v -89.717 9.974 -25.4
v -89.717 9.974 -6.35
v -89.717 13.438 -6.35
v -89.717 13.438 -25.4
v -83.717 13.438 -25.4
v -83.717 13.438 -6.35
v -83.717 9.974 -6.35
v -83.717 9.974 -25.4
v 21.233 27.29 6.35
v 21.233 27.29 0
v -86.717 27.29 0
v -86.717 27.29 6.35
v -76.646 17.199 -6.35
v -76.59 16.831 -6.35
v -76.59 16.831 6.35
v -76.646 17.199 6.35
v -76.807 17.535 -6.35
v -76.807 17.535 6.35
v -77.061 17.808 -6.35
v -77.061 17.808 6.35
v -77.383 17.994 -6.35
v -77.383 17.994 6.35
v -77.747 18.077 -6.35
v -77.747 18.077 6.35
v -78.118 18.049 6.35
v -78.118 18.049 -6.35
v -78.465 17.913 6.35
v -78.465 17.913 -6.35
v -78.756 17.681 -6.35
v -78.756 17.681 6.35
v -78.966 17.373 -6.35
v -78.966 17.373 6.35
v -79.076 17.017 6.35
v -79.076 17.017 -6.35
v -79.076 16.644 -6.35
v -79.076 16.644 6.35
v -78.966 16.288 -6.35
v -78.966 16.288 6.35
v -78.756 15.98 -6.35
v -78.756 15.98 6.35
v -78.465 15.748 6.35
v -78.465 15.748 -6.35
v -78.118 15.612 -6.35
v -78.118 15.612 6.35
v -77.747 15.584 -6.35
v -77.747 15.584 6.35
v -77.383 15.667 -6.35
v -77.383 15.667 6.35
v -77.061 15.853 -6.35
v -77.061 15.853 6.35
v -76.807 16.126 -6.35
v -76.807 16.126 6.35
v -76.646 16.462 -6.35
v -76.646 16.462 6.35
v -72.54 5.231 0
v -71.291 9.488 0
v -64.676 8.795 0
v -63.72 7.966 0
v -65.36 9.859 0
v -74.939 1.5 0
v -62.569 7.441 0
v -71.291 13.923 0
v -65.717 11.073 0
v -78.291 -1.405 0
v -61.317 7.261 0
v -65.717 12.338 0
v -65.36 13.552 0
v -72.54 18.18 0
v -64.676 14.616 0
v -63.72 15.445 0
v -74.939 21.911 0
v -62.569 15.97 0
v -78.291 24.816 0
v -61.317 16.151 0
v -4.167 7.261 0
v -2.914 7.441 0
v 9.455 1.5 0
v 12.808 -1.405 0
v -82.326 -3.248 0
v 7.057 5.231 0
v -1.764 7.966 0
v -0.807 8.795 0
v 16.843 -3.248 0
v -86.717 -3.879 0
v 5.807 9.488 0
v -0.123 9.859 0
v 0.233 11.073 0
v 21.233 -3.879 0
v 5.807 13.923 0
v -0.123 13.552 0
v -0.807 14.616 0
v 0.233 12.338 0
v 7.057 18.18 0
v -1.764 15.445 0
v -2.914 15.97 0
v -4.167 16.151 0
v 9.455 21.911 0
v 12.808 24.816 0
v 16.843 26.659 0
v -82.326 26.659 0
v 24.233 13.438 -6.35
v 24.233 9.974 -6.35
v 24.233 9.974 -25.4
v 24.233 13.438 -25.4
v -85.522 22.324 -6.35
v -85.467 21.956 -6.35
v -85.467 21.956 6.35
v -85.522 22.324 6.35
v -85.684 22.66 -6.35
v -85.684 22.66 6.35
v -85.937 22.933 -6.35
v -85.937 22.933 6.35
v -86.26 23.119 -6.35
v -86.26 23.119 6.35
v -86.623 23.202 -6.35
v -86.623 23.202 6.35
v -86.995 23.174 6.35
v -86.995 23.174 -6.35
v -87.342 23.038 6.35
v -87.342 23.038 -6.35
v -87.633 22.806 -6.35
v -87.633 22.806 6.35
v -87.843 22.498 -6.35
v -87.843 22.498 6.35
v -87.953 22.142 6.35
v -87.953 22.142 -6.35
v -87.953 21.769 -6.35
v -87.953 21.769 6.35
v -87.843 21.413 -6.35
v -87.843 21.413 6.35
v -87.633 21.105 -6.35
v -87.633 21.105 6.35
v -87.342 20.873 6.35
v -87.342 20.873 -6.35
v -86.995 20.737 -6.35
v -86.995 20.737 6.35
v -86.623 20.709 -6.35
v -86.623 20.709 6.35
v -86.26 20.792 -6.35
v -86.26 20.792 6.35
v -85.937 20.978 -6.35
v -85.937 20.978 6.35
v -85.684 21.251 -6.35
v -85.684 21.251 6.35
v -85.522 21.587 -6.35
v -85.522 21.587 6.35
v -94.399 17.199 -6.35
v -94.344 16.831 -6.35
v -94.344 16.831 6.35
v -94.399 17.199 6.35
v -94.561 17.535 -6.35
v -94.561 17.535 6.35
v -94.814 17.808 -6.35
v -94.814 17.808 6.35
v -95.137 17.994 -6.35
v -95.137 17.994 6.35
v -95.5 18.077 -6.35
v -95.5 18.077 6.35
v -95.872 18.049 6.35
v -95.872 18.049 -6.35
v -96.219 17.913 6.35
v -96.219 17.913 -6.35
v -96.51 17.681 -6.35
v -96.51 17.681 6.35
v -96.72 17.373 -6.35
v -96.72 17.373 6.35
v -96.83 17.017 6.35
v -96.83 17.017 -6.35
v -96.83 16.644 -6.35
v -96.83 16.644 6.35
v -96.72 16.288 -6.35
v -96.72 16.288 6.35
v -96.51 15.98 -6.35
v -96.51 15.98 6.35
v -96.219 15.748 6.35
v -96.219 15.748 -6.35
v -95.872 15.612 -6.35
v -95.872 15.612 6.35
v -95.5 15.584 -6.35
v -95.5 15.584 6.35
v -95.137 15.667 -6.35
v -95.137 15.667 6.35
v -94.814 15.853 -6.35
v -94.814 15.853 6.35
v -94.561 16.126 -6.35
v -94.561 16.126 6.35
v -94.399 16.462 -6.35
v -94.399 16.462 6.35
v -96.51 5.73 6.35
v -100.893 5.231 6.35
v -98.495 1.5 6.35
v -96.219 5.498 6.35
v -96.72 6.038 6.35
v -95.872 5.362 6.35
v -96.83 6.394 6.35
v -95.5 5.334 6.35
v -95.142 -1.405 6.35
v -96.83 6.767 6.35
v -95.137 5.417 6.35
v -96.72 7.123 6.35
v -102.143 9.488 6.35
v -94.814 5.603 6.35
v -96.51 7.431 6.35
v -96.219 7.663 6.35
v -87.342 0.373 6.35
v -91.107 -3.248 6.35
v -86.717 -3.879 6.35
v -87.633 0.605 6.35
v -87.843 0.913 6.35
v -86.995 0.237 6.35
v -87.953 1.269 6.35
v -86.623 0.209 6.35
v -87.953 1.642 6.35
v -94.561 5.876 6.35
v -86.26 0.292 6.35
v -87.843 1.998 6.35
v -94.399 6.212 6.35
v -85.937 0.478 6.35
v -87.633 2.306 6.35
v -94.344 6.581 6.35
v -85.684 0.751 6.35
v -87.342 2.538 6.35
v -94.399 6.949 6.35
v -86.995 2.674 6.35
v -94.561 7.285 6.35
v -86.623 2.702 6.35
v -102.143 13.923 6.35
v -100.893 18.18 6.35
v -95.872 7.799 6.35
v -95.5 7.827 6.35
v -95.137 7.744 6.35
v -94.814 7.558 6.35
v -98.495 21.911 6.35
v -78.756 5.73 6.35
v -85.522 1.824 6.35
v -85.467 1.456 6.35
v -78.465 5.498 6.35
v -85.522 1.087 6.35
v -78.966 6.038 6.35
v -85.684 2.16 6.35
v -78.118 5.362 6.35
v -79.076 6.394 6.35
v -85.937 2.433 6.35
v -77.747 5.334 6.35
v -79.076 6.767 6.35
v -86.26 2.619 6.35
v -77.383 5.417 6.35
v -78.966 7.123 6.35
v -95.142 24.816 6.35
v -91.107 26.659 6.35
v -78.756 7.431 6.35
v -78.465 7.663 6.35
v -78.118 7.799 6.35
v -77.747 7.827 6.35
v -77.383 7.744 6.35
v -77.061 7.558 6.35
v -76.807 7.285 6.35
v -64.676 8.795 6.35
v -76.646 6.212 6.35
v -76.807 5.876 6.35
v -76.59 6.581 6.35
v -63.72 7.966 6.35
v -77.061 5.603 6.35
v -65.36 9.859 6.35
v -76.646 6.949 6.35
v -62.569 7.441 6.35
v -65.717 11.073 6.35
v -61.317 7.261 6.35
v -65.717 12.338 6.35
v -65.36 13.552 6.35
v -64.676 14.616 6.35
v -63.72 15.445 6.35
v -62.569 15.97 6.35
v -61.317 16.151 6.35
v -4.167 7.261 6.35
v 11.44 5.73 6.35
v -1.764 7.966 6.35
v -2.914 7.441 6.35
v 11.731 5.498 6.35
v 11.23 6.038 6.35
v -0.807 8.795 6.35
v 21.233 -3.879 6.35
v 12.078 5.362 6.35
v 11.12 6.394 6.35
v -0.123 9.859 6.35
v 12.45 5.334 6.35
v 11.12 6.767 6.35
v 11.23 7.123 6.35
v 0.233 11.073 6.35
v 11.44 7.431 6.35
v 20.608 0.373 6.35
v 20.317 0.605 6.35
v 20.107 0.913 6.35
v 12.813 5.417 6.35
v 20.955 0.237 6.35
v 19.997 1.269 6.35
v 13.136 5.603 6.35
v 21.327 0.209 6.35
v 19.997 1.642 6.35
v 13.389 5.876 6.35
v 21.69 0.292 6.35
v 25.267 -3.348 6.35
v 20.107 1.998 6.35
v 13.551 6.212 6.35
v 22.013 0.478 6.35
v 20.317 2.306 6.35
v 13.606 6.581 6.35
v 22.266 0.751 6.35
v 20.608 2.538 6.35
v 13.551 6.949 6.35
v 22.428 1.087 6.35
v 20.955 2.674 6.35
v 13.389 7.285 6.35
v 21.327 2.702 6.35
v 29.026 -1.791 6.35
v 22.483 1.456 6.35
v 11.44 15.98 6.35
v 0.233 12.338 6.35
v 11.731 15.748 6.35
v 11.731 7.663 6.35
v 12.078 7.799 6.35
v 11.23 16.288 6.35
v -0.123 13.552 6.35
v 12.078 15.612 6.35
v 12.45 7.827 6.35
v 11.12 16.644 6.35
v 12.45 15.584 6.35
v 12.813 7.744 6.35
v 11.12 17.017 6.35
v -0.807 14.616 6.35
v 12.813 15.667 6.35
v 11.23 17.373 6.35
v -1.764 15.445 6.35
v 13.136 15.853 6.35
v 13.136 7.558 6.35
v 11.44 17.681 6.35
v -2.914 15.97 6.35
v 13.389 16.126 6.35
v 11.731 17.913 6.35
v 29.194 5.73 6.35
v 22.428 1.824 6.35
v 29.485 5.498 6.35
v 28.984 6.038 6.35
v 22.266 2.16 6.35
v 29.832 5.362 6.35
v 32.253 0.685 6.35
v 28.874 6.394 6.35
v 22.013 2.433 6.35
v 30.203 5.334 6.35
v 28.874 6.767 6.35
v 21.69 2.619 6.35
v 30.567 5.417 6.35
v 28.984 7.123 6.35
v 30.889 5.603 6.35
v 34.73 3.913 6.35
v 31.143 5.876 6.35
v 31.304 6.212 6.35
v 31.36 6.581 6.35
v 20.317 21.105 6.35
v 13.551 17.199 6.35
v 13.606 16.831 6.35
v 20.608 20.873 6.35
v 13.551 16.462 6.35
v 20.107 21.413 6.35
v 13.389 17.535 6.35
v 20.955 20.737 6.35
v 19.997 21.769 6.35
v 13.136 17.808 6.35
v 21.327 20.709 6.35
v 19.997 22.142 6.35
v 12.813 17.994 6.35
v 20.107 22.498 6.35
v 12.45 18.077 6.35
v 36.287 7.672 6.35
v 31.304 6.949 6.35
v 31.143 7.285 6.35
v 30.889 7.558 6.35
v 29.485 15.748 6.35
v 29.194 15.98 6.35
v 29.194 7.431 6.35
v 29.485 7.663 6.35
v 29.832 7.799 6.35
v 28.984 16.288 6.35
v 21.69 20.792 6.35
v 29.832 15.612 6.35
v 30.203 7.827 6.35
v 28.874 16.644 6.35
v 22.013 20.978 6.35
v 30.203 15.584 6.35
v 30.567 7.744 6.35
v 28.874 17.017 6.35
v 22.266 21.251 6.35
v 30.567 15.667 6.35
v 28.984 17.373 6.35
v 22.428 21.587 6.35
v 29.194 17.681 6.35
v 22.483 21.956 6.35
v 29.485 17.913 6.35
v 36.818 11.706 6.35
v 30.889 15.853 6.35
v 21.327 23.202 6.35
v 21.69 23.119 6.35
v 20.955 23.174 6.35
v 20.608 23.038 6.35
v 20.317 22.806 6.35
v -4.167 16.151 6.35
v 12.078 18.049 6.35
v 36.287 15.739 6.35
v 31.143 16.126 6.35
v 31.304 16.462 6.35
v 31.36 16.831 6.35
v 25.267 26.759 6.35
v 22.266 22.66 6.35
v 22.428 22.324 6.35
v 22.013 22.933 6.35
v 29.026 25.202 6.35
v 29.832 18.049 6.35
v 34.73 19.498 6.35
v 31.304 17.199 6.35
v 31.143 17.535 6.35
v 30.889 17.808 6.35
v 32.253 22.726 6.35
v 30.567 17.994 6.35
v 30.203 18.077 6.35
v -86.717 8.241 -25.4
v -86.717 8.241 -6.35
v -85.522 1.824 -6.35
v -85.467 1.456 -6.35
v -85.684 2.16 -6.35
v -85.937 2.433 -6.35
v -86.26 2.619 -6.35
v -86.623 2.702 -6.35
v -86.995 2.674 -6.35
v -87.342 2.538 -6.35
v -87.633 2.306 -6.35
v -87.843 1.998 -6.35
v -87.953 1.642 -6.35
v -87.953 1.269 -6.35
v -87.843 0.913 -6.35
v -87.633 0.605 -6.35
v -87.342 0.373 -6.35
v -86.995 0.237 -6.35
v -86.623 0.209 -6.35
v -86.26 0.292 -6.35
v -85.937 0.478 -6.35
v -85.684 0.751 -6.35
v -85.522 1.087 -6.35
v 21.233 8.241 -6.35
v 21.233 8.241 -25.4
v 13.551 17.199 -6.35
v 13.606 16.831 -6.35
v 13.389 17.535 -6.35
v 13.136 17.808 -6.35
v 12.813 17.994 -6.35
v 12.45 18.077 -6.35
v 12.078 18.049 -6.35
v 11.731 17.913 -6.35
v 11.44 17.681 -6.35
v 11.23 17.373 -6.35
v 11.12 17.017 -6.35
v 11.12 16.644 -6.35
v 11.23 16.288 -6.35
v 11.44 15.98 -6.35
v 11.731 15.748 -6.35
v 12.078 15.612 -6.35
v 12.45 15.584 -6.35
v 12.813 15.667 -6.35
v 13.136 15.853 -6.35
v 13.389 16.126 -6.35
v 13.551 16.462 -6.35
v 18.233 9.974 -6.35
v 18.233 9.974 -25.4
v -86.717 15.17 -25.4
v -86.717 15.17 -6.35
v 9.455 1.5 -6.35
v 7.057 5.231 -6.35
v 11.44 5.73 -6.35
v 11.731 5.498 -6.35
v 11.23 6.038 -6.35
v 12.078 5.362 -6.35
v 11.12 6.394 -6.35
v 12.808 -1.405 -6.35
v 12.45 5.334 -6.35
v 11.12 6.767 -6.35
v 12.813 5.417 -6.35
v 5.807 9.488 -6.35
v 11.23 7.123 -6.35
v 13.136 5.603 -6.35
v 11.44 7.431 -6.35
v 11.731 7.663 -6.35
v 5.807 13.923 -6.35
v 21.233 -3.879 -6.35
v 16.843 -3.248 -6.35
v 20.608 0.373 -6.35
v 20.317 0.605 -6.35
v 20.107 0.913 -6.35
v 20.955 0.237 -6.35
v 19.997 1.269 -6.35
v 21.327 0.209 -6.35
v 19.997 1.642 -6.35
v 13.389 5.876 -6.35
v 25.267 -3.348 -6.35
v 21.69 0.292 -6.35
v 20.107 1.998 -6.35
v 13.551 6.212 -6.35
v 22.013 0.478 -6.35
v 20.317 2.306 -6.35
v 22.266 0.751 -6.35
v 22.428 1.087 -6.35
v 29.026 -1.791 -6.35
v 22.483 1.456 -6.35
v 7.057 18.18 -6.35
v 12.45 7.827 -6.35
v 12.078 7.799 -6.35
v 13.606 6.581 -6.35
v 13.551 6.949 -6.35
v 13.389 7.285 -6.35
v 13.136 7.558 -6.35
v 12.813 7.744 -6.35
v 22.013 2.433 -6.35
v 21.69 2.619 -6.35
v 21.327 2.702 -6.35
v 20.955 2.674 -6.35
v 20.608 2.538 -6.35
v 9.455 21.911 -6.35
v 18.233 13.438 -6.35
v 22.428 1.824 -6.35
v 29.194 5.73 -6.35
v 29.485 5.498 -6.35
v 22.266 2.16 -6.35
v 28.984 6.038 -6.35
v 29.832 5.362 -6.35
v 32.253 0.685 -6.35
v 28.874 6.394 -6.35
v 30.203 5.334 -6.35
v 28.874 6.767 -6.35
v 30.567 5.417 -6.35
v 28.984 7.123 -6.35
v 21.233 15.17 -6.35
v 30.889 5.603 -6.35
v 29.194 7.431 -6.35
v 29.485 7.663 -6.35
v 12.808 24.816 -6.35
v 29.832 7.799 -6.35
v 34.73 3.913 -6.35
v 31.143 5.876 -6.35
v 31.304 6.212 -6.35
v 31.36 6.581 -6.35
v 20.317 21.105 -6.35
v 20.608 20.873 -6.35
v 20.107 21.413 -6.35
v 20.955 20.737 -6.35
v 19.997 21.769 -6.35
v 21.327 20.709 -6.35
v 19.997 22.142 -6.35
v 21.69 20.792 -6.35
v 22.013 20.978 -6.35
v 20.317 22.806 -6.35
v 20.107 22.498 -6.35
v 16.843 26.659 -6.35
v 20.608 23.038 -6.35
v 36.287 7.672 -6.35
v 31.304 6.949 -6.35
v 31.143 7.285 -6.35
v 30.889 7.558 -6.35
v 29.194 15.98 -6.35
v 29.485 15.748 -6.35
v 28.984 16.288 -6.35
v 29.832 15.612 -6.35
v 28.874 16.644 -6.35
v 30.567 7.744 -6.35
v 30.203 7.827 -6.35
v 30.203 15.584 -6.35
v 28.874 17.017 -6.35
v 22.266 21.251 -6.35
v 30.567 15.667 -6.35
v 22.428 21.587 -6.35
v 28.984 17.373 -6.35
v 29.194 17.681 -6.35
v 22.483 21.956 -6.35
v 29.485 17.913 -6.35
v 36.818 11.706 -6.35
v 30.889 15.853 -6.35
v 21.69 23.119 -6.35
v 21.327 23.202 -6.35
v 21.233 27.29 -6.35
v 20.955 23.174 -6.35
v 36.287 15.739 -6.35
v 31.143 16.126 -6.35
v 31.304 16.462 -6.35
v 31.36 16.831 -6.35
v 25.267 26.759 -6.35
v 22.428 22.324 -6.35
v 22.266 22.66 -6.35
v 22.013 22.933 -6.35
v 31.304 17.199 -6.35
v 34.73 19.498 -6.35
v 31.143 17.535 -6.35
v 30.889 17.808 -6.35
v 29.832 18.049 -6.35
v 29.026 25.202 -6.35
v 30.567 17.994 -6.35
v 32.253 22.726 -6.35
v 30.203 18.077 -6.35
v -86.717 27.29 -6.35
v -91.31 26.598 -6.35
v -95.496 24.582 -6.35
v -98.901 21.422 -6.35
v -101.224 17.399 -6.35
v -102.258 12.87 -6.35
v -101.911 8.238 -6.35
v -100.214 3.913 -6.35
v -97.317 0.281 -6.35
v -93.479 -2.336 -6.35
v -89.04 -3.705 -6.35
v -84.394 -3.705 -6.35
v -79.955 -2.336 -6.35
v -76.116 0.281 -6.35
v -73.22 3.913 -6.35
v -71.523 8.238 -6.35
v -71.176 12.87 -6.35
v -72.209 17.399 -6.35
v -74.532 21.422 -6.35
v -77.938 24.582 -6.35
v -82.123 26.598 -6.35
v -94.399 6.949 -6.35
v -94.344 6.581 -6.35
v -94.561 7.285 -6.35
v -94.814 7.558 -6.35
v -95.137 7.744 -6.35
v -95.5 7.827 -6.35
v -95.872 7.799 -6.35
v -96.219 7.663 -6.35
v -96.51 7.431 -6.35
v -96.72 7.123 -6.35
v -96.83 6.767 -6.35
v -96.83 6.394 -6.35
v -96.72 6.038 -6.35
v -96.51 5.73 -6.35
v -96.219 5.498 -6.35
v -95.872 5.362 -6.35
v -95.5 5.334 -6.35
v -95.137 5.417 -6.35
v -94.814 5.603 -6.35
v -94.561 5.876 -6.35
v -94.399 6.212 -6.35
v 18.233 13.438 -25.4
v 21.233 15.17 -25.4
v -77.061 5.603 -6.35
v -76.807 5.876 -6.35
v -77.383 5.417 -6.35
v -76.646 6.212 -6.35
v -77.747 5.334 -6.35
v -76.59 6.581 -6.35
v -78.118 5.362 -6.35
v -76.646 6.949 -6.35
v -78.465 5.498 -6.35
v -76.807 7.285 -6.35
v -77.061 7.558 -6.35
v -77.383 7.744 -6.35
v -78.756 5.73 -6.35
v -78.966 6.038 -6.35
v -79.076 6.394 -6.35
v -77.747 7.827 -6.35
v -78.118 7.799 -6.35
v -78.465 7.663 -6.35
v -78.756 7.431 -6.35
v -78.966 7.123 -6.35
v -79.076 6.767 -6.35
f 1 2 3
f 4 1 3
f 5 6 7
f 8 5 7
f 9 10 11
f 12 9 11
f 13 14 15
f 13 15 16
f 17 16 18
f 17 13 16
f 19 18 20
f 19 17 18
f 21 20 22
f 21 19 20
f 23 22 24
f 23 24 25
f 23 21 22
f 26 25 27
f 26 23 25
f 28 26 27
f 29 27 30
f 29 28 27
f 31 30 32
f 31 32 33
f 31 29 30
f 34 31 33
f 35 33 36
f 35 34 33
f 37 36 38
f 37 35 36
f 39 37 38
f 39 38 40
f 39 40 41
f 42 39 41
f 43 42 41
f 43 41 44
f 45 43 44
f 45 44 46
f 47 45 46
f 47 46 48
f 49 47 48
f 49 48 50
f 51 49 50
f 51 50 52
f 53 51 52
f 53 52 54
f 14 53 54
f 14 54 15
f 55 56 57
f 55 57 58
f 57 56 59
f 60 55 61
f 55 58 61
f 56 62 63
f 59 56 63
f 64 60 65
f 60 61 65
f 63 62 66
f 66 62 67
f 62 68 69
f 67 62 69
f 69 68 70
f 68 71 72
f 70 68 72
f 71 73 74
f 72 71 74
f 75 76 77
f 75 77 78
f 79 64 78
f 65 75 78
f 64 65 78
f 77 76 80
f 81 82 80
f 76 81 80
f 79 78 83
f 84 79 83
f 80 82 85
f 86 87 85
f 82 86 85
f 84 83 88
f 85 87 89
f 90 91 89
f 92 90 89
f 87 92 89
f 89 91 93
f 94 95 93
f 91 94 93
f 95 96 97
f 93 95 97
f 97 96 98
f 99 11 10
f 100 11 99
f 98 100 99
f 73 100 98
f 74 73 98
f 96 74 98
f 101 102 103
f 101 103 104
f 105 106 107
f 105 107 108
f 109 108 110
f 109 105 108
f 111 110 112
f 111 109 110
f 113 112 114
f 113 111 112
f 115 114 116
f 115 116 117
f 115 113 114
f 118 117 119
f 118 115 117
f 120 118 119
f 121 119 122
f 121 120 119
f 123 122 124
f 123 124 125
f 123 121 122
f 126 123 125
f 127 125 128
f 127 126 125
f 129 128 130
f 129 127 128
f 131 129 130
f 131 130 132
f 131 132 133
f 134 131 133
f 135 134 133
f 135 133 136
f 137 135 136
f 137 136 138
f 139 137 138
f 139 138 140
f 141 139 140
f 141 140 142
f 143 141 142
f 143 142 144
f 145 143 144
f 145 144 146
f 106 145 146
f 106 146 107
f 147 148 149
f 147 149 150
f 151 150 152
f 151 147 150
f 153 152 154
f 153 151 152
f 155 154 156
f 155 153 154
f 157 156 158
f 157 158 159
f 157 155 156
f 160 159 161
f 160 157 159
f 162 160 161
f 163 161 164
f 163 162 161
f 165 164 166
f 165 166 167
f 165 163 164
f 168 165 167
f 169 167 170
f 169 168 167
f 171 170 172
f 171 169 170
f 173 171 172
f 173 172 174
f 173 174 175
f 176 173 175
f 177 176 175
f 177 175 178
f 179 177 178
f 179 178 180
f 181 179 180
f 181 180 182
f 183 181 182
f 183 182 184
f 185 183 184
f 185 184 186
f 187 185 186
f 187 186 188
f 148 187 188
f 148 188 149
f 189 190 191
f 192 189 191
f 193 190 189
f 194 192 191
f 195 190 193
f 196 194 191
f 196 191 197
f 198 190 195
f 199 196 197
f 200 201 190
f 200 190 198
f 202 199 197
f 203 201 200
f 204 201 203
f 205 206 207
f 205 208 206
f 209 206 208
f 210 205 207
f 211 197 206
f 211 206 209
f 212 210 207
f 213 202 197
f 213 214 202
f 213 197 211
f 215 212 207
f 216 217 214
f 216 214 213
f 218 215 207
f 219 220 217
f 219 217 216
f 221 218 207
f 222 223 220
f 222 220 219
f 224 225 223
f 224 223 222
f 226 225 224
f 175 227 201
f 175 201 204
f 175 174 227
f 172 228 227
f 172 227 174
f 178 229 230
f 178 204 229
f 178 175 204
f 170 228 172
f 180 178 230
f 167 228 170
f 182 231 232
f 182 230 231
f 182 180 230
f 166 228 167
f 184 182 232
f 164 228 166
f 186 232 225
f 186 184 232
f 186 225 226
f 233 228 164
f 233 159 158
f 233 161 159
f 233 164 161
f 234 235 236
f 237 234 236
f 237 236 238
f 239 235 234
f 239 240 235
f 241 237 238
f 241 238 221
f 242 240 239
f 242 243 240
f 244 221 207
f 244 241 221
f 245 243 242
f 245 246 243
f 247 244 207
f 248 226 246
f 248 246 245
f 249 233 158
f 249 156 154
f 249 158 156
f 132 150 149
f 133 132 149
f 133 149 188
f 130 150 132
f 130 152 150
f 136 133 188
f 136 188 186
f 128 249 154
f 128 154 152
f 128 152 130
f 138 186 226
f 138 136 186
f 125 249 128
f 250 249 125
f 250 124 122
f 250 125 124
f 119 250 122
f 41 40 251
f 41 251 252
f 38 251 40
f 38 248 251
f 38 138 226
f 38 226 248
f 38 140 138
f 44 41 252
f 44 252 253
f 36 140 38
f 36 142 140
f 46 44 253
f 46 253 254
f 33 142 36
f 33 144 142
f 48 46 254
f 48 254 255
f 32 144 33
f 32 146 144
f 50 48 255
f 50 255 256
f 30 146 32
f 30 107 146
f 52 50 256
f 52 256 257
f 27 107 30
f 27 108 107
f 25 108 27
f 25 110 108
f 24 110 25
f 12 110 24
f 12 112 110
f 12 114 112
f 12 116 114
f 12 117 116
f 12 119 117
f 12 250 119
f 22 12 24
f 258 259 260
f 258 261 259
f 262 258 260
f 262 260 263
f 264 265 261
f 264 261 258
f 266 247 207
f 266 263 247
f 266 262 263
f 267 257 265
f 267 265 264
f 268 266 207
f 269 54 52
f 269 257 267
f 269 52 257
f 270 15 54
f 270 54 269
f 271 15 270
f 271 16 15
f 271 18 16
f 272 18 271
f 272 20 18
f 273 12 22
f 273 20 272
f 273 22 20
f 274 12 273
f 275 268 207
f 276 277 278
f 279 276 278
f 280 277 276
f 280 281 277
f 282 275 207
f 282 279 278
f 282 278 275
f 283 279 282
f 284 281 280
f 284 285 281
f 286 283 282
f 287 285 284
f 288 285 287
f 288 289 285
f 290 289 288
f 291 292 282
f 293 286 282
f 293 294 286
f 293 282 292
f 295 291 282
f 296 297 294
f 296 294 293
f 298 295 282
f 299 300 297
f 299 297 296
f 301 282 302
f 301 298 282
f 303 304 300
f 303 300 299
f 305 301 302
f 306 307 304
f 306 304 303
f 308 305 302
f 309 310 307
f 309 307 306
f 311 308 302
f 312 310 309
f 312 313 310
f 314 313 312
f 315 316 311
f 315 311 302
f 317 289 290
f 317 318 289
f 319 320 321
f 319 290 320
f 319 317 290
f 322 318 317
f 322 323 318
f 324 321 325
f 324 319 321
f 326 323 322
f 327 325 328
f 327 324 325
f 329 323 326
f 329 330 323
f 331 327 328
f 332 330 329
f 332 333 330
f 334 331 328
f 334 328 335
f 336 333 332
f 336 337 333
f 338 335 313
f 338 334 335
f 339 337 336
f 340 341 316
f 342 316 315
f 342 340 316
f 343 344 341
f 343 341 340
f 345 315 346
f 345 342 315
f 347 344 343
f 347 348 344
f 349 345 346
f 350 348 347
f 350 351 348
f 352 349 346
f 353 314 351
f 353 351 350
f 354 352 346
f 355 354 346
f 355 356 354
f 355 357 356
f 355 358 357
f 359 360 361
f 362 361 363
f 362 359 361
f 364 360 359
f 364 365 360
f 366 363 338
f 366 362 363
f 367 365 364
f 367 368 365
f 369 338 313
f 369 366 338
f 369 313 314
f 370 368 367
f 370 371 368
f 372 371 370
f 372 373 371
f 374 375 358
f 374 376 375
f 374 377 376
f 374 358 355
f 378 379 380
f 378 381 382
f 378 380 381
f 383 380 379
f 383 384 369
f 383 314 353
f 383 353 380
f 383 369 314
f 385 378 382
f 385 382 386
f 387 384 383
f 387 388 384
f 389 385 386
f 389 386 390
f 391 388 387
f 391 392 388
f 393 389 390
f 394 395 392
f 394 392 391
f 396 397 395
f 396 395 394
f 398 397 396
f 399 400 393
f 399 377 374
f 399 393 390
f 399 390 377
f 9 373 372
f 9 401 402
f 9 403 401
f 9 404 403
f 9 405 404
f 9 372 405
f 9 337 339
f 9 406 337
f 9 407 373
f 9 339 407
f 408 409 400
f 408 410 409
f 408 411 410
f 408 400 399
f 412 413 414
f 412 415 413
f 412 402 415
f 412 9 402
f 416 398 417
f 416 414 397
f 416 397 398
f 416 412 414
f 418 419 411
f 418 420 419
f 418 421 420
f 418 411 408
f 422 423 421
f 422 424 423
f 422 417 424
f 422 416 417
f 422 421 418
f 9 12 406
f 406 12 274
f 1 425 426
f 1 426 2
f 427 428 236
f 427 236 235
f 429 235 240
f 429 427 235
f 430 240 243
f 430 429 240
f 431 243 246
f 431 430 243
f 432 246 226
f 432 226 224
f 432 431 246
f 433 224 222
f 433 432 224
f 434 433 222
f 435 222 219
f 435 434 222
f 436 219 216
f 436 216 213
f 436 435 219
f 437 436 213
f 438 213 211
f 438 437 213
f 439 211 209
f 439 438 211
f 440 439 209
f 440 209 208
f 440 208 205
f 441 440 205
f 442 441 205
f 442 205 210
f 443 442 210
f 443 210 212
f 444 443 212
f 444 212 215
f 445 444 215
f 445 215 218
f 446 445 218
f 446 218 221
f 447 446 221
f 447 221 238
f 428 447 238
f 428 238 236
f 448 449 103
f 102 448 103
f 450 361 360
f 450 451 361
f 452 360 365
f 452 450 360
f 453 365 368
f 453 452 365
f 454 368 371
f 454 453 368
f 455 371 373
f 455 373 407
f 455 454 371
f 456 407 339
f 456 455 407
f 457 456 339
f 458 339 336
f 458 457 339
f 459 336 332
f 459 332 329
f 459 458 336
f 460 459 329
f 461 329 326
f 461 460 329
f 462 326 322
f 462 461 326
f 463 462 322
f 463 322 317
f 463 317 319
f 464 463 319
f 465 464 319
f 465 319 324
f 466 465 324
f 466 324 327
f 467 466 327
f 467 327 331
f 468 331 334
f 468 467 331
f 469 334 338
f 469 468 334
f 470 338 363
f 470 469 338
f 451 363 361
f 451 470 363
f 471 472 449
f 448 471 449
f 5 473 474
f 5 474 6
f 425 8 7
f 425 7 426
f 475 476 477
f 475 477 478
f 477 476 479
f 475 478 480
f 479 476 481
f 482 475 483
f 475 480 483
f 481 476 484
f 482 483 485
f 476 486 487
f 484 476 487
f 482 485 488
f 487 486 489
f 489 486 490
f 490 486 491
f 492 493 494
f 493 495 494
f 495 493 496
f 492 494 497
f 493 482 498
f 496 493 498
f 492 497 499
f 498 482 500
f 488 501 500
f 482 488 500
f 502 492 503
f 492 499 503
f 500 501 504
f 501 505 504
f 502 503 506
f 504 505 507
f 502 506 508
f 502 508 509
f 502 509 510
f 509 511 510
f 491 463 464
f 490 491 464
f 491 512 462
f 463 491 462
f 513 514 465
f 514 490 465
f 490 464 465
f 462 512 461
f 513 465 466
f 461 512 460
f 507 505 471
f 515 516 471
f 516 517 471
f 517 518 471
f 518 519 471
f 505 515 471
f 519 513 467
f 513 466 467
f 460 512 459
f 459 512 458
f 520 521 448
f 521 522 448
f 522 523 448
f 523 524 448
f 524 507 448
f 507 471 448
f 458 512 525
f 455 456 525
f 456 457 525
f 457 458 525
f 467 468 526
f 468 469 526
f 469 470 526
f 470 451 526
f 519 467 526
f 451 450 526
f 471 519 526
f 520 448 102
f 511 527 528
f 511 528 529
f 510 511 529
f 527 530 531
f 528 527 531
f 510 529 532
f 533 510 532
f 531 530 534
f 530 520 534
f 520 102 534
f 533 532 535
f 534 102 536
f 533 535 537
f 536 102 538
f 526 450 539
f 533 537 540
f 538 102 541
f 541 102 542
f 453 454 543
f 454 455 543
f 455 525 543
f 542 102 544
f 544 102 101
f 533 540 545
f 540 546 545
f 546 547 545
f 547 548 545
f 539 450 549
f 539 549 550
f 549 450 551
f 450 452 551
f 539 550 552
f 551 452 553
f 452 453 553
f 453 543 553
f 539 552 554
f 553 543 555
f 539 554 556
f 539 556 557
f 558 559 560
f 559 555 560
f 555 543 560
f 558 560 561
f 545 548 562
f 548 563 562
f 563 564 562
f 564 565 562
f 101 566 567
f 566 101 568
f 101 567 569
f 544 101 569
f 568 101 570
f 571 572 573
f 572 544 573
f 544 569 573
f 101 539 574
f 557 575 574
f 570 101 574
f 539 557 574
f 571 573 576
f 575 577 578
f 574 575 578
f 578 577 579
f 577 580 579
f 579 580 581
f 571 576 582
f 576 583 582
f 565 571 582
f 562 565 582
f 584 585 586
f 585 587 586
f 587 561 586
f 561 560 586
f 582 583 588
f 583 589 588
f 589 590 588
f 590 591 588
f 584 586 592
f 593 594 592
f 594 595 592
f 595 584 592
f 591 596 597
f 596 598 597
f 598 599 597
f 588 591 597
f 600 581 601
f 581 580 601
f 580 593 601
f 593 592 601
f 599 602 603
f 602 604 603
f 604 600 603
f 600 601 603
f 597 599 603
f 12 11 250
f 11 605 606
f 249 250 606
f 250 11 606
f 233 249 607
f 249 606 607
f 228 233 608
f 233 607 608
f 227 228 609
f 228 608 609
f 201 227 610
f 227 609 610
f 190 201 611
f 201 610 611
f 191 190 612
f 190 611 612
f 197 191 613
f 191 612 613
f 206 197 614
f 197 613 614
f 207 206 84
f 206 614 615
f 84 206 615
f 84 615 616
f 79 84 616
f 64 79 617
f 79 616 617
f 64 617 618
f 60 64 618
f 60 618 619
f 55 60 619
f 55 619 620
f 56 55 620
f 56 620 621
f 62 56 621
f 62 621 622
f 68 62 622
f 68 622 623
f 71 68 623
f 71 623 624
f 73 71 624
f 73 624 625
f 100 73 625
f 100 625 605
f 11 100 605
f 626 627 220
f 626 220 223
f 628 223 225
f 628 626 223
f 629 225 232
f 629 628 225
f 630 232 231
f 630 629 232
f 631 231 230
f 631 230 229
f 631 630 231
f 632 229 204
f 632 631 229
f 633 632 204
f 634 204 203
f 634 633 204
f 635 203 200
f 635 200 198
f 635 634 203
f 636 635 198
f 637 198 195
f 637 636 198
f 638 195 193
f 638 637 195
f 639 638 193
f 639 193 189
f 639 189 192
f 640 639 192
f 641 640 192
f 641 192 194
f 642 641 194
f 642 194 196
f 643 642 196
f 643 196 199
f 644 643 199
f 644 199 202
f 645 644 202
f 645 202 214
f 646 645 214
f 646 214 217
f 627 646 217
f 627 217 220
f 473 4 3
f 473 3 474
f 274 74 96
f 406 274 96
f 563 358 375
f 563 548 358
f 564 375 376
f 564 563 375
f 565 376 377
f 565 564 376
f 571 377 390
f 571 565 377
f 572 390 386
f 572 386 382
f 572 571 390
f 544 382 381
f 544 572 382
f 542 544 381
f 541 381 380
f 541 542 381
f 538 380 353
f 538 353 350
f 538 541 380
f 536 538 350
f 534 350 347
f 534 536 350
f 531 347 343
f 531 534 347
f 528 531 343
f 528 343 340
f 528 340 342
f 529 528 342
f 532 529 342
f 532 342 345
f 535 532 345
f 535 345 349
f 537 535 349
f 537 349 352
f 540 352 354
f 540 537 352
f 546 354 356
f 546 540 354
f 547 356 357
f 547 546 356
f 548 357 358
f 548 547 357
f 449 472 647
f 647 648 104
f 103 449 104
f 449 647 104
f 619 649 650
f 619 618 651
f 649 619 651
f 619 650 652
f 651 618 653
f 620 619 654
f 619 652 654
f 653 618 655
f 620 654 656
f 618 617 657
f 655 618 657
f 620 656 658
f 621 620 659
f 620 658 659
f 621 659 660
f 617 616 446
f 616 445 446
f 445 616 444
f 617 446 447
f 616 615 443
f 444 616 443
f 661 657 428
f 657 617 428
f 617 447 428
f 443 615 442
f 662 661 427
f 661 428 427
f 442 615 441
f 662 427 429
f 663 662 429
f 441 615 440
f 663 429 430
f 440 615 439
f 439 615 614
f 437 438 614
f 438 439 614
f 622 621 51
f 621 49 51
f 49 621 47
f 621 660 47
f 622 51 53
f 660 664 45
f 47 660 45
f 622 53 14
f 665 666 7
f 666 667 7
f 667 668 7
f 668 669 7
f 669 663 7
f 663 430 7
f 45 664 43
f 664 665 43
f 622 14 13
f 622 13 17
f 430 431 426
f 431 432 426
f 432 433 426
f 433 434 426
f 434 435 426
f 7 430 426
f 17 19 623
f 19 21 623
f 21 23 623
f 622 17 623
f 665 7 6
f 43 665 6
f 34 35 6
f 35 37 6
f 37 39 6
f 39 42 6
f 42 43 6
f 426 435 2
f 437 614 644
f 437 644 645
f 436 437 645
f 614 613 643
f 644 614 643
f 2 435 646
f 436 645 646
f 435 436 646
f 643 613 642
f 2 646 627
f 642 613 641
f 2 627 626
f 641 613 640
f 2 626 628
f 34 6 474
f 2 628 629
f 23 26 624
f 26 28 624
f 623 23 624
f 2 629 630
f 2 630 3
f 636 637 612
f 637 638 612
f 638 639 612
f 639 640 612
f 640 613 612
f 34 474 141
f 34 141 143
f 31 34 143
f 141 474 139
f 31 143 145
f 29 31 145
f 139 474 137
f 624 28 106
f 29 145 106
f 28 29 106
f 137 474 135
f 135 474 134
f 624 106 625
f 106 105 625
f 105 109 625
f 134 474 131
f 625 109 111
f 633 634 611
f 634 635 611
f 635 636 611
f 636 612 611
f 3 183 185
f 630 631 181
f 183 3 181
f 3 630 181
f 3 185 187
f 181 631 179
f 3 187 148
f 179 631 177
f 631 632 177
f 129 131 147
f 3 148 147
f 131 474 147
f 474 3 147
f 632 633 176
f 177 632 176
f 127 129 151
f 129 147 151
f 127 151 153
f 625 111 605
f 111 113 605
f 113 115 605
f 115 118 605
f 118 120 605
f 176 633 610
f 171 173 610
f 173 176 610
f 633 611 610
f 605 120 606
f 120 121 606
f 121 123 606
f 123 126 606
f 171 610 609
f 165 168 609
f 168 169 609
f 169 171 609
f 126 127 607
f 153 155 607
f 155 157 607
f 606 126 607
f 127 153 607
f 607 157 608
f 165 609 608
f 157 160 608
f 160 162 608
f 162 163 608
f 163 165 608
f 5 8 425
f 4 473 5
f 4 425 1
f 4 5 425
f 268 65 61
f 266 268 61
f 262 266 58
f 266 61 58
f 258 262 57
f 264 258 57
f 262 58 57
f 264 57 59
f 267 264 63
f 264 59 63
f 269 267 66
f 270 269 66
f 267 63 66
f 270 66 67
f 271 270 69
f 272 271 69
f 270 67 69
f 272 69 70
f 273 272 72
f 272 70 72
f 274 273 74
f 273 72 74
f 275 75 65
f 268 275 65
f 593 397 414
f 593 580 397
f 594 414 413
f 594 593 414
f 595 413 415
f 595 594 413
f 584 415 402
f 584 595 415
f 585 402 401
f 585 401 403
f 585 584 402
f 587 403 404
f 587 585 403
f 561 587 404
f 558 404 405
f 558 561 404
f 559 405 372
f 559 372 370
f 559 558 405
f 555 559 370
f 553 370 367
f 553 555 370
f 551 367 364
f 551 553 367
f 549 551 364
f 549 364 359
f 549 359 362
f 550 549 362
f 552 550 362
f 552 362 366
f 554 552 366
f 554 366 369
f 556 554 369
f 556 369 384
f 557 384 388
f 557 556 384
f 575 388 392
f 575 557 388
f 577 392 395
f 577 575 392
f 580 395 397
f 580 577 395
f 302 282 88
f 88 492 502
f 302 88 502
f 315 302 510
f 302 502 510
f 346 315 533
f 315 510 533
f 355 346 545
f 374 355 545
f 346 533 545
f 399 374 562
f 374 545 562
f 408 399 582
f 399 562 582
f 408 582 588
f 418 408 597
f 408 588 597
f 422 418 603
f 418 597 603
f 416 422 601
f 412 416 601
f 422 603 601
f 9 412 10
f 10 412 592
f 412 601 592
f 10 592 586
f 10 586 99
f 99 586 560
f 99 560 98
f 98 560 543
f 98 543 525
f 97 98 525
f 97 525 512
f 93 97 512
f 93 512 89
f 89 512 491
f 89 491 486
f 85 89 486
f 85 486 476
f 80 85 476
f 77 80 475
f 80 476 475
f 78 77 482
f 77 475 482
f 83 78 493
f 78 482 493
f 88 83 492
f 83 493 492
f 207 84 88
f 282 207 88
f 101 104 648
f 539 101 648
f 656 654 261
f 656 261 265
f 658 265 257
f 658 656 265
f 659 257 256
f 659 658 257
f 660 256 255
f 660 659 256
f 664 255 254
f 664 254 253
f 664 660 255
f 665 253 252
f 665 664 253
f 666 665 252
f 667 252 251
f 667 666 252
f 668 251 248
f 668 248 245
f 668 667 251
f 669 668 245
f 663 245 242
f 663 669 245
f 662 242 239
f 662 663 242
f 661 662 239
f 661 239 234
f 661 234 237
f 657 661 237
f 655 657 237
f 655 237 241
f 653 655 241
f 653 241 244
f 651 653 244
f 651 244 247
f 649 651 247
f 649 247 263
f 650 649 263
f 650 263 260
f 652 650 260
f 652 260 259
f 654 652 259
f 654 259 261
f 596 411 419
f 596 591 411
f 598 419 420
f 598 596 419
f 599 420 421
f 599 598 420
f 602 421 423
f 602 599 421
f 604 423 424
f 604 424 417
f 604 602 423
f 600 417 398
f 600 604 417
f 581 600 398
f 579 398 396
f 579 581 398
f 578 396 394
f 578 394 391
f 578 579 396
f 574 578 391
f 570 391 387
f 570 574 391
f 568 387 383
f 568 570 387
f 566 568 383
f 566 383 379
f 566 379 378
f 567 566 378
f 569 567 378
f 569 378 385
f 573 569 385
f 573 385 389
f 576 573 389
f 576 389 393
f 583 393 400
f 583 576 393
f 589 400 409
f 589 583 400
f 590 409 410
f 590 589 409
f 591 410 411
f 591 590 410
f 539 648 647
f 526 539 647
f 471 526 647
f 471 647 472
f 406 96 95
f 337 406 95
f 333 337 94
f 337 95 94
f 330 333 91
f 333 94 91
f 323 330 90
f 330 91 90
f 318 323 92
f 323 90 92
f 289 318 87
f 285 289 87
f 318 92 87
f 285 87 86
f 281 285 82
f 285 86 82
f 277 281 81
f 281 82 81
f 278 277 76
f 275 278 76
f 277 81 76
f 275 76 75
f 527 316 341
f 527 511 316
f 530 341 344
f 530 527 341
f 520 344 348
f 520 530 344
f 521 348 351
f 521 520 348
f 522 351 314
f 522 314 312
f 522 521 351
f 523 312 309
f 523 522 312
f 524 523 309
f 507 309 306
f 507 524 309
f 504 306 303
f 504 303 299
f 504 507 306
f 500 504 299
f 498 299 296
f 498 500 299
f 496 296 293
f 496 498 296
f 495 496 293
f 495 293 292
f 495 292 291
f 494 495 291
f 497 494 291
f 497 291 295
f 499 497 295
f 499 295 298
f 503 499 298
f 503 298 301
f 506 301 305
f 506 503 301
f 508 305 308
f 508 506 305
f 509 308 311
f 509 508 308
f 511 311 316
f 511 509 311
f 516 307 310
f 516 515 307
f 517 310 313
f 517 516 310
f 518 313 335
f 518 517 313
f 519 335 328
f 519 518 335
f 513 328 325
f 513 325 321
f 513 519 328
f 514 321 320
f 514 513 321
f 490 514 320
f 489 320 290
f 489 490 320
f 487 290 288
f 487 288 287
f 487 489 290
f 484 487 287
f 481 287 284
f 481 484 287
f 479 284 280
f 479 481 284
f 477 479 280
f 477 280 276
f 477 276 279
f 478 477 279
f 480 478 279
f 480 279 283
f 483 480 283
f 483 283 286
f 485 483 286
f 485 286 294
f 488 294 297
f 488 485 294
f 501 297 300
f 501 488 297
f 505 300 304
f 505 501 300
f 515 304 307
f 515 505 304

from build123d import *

# Parameters (mm, degrees)
SKETCH1_R                = 15.584715873
SKETCH1_R_2              = 1.25
BOSS_EXTRUDE5_DEPTH      = 6.35
BOSS_EXTRUDE6_START      = -6.35
SKETCH1_7_R              = 15.584715873
SKETCH1_7_R_2            = 1.25
BOSS_EXTRUDE6_DEPTH      = 6.35
BOSS_EXTRUDE7_DEPTH      = 6.35
BOSS_EXTRUDE7_DEPTH_BACK = 25.4


with BuildPart() as part:
    # Sketch1 → Boss-Extrude5 (new body)
    # profile 1 of 3: a face of its own
    with BuildSketch(Plane.XY):
        with BuildLine():
            Line((21.23324901, 27.290268066), (-86.71675099, 27.290268066))
            ThreePointArc((-86.71675099, 27.290268066), (-75.696692713, 22.72561047), (-71.132035117, 11.705552193))
            ThreePointArc((-71.132035117, 11.705552193), (-75.696692713, 0.685493916), (-86.71675099, -3.879163681))
            Line((-86.71675099, -3.879163681), (21.23324901, -3.879163681))
            ThreePointArc((21.23324901, -3.879163681), (5.648533136, 11.705552193), (21.23324901, 27.290268066))
        make_face()
        with BuildLine():
            ThreePointArc((-61.31675099, 7.260552193), (-65.76175099, 11.705552193), (-61.31675099, 16.150552193))
            Line((-61.31675099, 16.150552193), (-4.16675099, 16.150552193))
            ThreePointArc((-4.16675099, 16.150552193), (0.27824901, 11.705552193), (-4.16675099, 7.260552193))
            Line((-4.16675099, 7.260552193), (-61.31675099, 7.260552193))
        make_face(mode=Mode.SUBTRACT)
    # profile 2 of 3: a face of its own
    with BuildSketch(Plane.XY):
        with Locations((-86.71675099, 11.705552193)):
            Circle(SKETCH1_R)
        with Locations((-77.839990601, 16.830552193)):
            Circle(SKETCH1_R_2, mode=Mode.SUBTRACT)
        with Locations((-77.839990601, 6.580552193)):
            Circle(SKETCH1_R_2, mode=Mode.SUBTRACT)
        with Locations((-86.71675099, 1.455552193)):
            Circle(SKETCH1_R_2, mode=Mode.SUBTRACT)
        with Locations((-95.593511379, 6.580552193)):
            Circle(SKETCH1_R_2, mode=Mode.SUBTRACT)
        with Locations((-95.593511379, 16.830552193)):
            Circle(SKETCH1_R_2, mode=Mode.SUBTRACT)
        with Locations((-86.71675099, 21.955552193)):
            Circle(SKETCH1_R_2, mode=Mode.SUBTRACT)
        Polygon((-89.71675099, 9.973501385), (-89.71675099, 13.437603), (-86.71675099, 15.169653808), (-83.71675099, 13.437603), (-83.71675099, 9.973501385), (-86.71675099, 8.241450578), align=None, mode=Mode.SUBTRACT)
    # profile 3 of 3: a face of its own
    with BuildSketch(Plane.XY):
        with BuildLine():
            ThreePointArc((36.817964883, 11.705552193), (32.253307287, 22.72561047), (21.23324901, 27.290268066))
            ThreePointArc((21.23324901, 27.290268066), (5.648533136, 11.705552193), (21.23324901, -3.879163681))
            ThreePointArc((21.23324901, -3.879163681), (32.253307287, 0.685493916), (36.817964883, 11.705552193))
        make_face()
        with Locations((21.23324901, 1.455552193)):
            Circle(SKETCH1_R_2, mode=Mode.SUBTRACT)
        with Locations((12.356488621, 6.580552193)):
            Circle(SKETCH1_R_2, mode=Mode.SUBTRACT)
        with Locations((30.110009399, 6.580552193)):
            Circle(SKETCH1_R_2, mode=Mode.SUBTRACT)
        Polygon((21.23324901, 15.169653808), (24.23324901, 13.437603), (24.23324901, 9.973501385), (21.23324901, 8.241450578), (18.23324901, 9.973501385), (18.23324901, 13.437603), align=None, mode=Mode.SUBTRACT)
        with Locations((12.356488621, 16.830552193)):
            Circle(SKETCH1_R_2, mode=Mode.SUBTRACT)
        with Locations((30.110009399, 16.830552193)):
            Circle(SKETCH1_R_2, mode=Mode.SUBTRACT)
        with Locations((21.23324901, 21.955552193)):
            Circle(SKETCH1_R_2, mode=Mode.SUBTRACT)
    extrude(amount=BOSS_EXTRUDE5_DEPTH)

    # Sketch1<7> → Boss-Extrude6 (add)
    # profile 1 of 2: a face of its own
    with BuildSketch(Plane.XY.offset(BOSS_EXTRUDE6_START)):
        with Locations(Location((-86.71675099, 11.705552193, 0), (0, 0, 90))):
            Circle(SKETCH1_7_R)
        with Locations((-77.839990601, 16.830552193)):
            Circle(SKETCH1_7_R_2, mode=Mode.SUBTRACT)
        with Locations((-77.839990601, 6.580552193)):
            Circle(SKETCH1_7_R_2, mode=Mode.SUBTRACT)
        with Locations((-86.71675099, 1.455552193)):
            Circle(SKETCH1_7_R_2, mode=Mode.SUBTRACT)
        with Locations((-95.593511379, 6.580552193)):
            Circle(SKETCH1_7_R_2, mode=Mode.SUBTRACT)
        with Locations((-95.593511379, 16.830552193)):
            Circle(SKETCH1_7_R_2, mode=Mode.SUBTRACT)
        with Locations((-86.71675099, 21.955552193)):
            Circle(SKETCH1_7_R_2, mode=Mode.SUBTRACT)
        Polygon((-89.71675099, 9.973501385), (-89.71675099, 13.437603), (-86.71675099, 15.169653808), (-83.71675099, 13.437603), (-83.71675099, 9.973501385), (-86.71675099, 8.241450578), align=None, mode=Mode.SUBTRACT)
    # profile 2 of 2: a face of its own
    with BuildSketch(Plane.XY.offset(BOSS_EXTRUDE6_START)):
        with BuildLine():
            ThreePointArc((36.817964883, 11.705552193), (32.253307287, 22.72561047), (21.23324901, 27.290268066))
            ThreePointArc((21.23324901, 27.290268066), (5.648533136, 11.705552193), (21.23324901, -3.879163681))
            ThreePointArc((21.23324901, -3.879163681), (32.253307287, 0.685493916), (36.817964883, 11.705552193))
        make_face()
        with Locations((21.23324901, 1.455552193)):
            Circle(SKETCH1_7_R_2, mode=Mode.SUBTRACT)
        with Locations((12.356488621, 6.580552193)):
            Circle(SKETCH1_7_R_2, mode=Mode.SUBTRACT)
        with Locations((30.110009399, 6.580552193)):
            Circle(SKETCH1_7_R_2, mode=Mode.SUBTRACT)
        Polygon((21.23324901, 15.169653808), (24.23324901, 13.437603), (24.23324901, 9.973501385), (21.23324901, 8.241450578), (18.23324901, 9.973501385), (18.23324901, 13.437603), align=None, mode=Mode.SUBTRACT)
        with Locations((12.356488621, 16.830552193)):
            Circle(SKETCH1_7_R_2, mode=Mode.SUBTRACT)
        with Locations((30.110009399, 16.830552193)):
            Circle(SKETCH1_7_R_2, mode=Mode.SUBTRACT)
        with Locations((21.23324901, 21.955552193)):
            Circle(SKETCH1_7_R_2, mode=Mode.SUBTRACT)
    extrude(amount=BOSS_EXTRUDE6_DEPTH)

    # Sketch1<8> → Boss-Extrude7 (add, two sides: drawn at the far end of the back side and taken through both)
    with BuildSketch(Plane.XY.offset(-BOSS_EXTRUDE7_DEPTH_BACK)):
        Polygon((-86.71675099, 15.169653808), (-83.71675099, 13.437603), (-83.71675099, 9.973501385), (-86.71675099, 8.241450578), (-89.71675099, 9.973501385), (-89.71675099, 13.437603), align=None)
        Polygon((24.23324901, 13.437603), (21.23324901, 15.169653808), (18.23324901, 13.437603), (18.23324901, 9.973501385), (21.23324901, 8.241450578), (24.23324901, 9.973501385), align=None)
    extrude(amount=BOSS_EXTRUDE7_DEPTH + BOSS_EXTRUDE7_DEPTH_BACK)


solid = part.part
